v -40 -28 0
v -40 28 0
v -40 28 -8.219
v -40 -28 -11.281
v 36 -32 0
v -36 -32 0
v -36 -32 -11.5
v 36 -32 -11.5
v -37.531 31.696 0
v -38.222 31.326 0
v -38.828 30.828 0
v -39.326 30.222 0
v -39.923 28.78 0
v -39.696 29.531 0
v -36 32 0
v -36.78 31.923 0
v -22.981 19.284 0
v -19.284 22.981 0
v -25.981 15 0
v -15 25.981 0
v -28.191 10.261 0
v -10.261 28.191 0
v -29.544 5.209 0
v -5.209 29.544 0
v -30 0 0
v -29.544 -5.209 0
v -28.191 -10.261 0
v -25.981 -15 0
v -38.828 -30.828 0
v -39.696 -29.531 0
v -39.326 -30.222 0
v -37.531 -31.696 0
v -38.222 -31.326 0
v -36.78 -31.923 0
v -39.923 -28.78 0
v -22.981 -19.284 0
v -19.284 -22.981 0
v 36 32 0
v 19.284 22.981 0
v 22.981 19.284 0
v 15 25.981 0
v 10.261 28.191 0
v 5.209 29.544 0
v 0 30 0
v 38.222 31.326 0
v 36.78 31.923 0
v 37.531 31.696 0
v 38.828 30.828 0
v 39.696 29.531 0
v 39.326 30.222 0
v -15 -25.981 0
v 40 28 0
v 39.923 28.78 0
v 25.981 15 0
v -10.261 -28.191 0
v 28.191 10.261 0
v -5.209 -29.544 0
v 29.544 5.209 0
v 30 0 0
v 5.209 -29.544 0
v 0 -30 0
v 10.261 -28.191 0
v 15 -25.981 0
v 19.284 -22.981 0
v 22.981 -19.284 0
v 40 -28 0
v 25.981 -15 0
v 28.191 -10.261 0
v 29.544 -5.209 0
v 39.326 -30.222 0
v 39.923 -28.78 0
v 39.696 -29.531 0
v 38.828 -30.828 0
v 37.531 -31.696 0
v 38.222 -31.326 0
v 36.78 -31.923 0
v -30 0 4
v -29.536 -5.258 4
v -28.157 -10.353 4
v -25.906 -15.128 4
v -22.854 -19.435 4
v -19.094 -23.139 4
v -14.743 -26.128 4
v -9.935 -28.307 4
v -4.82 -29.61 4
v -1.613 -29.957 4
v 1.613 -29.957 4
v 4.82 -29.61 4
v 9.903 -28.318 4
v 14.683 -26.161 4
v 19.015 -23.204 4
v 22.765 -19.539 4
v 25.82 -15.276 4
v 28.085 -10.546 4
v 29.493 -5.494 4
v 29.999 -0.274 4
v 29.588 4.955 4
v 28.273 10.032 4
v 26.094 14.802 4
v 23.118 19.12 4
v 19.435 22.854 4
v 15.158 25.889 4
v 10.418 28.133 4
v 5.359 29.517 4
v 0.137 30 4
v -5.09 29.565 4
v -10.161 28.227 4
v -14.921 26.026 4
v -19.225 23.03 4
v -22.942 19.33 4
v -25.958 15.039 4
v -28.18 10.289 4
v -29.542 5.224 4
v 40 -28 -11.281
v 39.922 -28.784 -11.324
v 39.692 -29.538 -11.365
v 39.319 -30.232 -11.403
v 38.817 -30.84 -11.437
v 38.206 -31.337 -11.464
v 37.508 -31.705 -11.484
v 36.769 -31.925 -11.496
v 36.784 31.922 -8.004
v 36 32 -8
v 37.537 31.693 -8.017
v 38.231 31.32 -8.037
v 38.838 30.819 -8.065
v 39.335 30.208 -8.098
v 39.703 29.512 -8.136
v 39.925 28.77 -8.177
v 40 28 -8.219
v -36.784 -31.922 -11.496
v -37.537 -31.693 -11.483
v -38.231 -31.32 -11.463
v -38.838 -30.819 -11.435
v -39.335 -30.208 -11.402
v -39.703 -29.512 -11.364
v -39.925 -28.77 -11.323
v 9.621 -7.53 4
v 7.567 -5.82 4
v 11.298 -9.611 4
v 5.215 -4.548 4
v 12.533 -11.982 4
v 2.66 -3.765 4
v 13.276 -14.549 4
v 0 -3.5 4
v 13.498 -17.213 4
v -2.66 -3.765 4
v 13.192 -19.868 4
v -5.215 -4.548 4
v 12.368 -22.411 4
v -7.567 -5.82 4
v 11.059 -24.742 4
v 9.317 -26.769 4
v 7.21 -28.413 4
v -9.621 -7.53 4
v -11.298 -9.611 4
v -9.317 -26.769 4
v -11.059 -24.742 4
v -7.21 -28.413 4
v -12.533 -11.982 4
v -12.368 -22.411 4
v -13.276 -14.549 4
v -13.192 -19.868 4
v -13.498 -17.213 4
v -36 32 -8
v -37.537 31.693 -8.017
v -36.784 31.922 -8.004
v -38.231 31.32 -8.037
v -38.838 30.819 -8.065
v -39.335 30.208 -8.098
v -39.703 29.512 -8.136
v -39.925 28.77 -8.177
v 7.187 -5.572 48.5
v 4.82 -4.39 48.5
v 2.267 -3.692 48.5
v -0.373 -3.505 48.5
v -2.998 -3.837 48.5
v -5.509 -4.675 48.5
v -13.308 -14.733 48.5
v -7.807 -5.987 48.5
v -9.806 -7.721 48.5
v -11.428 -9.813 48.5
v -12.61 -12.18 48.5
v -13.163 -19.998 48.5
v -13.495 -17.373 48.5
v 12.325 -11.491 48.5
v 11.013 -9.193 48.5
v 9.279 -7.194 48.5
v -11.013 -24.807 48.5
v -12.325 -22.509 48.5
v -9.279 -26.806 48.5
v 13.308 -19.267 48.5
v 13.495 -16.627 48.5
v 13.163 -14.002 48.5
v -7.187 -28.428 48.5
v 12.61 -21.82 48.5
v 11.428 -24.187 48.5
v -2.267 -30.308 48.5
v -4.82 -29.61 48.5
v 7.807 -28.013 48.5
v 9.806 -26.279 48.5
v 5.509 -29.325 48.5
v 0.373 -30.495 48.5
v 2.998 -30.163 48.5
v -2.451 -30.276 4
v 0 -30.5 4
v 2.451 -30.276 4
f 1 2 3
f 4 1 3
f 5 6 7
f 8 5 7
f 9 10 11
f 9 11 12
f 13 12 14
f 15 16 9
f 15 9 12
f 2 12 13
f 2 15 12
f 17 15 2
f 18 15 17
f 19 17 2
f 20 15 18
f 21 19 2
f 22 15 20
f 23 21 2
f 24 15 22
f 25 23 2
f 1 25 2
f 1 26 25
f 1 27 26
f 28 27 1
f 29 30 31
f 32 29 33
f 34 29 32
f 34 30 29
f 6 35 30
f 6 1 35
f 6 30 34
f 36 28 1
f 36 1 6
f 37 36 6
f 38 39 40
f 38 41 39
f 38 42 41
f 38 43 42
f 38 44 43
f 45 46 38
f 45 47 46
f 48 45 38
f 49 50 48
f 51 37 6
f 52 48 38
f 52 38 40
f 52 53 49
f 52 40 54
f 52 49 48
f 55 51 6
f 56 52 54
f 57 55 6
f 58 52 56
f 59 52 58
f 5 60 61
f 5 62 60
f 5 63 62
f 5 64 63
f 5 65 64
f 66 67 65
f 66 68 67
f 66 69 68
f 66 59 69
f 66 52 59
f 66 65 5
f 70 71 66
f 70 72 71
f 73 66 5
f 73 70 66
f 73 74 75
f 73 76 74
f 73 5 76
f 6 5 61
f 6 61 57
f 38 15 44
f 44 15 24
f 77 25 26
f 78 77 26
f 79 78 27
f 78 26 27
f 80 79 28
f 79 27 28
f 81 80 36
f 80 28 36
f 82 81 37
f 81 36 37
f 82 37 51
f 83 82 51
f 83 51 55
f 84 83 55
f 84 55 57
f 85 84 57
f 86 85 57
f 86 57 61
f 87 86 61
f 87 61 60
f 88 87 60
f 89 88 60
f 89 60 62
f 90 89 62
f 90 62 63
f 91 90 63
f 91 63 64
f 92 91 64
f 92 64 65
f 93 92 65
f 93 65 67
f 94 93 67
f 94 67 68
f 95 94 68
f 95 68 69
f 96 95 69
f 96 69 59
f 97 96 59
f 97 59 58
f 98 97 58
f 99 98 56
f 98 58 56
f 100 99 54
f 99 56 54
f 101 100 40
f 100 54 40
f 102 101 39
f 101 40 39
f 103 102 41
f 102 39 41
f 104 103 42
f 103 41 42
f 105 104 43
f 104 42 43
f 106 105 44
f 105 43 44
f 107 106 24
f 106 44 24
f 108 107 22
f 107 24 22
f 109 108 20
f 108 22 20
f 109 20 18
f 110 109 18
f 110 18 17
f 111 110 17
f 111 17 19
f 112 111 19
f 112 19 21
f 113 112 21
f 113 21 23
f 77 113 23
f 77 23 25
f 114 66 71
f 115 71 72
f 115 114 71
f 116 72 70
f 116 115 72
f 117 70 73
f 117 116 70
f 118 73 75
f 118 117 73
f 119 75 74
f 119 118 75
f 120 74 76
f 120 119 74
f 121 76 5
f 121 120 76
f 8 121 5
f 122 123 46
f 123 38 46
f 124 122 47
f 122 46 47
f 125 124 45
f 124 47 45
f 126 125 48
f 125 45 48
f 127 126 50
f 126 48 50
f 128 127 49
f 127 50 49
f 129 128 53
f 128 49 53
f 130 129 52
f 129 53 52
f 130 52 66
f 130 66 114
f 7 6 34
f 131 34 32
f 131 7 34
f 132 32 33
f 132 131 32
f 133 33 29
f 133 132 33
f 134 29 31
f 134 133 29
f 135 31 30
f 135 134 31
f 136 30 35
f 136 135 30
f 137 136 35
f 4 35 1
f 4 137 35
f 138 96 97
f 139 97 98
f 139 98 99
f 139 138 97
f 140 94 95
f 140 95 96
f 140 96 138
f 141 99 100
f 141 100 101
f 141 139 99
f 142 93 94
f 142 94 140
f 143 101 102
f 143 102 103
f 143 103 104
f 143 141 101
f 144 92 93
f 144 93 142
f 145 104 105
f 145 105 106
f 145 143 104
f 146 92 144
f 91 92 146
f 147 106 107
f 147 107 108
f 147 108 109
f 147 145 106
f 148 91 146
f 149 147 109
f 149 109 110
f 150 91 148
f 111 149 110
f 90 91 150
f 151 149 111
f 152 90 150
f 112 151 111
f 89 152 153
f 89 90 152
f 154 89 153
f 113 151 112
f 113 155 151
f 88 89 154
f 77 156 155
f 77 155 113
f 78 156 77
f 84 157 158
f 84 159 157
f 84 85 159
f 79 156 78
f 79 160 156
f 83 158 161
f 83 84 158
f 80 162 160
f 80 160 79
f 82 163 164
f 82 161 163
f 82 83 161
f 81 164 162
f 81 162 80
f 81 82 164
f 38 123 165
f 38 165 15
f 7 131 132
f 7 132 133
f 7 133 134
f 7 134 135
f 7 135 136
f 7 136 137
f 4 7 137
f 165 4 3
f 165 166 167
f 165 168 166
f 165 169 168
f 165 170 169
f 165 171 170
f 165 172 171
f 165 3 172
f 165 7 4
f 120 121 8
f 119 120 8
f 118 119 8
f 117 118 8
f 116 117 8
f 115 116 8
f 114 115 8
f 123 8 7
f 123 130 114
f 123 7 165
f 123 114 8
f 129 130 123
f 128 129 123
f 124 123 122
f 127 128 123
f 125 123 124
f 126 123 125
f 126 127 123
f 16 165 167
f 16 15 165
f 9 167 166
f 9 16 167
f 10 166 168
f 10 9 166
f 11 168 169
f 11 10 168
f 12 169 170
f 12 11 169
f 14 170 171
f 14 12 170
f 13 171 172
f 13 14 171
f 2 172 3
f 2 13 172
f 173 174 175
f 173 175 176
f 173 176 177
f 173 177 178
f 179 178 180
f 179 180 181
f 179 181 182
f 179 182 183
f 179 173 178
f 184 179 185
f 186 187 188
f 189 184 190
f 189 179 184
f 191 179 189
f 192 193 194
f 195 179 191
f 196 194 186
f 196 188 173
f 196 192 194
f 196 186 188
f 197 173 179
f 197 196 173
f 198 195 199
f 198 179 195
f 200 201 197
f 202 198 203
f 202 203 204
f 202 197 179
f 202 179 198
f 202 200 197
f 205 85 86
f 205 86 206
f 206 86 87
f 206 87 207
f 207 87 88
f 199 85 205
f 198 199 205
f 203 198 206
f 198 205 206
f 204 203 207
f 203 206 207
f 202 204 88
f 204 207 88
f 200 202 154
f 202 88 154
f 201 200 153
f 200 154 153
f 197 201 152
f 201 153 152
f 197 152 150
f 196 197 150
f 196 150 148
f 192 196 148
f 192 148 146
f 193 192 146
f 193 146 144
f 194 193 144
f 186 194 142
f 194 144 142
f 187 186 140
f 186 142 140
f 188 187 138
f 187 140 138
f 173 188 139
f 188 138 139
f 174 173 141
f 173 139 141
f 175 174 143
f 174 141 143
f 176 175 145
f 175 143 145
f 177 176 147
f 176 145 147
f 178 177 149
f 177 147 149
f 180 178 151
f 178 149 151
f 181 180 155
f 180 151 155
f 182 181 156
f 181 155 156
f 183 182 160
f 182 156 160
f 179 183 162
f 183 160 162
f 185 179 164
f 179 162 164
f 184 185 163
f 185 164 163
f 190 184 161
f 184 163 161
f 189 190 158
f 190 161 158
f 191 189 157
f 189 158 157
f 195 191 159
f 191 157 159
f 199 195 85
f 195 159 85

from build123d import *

# Parameters (mm, degrees)
BOSS_EXTRUDE1_DEPTH = 40
FILLET1_R           = 4
SKETCH2_R           = 30
BOSS_EXTRUDE2_DEPTH = 4
SKETCH3_R           = 13.5
BOSS_EXTRUDE3_DEPTH = 44.5


with BuildPart() as part:
    # Sketch1 → Boss-Extrude1 (new, symmetric)
    with BuildSketch(Plane(origin=(0, 0, 0), x_dir=(0, 0, -1), z_dir=(1, 0, 0))):
        Polygon((0, 32), (0, -32), (11.5, -32), (8, 32), align=None)
    extrude(amount=BOSS_EXTRUDE1_DEPTH, both=True)

    # Fillet1
    fillet1_edges = [part.edges().sort_by_distance(p)[0] for p in [
        (40, -32, -5.75),
        (40, 32, -4),
        (-40, -32, -5.75),
        (-40, 32, -4),
    ]]
    fillet(fillet1_edges, radius=FILLET1_R)

    # Sketch2 → Boss-Extrude2 (add)
    with BuildSketch(Plane.XY):
        with Locations(Location((0, 0, 0), (0, 0, 180))):
            Circle(SKETCH2_R)
    extrude(amount=BOSS_EXTRUDE2_DEPTH)

    # Sketch3 → Boss-Extrude3 (add)
    with BuildSketch(Plane.XY.offset(4)):
        with Locations(Location((0, -17, 0), (0, 0, 249.082562466))):
            Circle(SKETCH3_R)
    extrude(amount=BOSS_EXTRUDE3_DEPTH)


solid = part.part
